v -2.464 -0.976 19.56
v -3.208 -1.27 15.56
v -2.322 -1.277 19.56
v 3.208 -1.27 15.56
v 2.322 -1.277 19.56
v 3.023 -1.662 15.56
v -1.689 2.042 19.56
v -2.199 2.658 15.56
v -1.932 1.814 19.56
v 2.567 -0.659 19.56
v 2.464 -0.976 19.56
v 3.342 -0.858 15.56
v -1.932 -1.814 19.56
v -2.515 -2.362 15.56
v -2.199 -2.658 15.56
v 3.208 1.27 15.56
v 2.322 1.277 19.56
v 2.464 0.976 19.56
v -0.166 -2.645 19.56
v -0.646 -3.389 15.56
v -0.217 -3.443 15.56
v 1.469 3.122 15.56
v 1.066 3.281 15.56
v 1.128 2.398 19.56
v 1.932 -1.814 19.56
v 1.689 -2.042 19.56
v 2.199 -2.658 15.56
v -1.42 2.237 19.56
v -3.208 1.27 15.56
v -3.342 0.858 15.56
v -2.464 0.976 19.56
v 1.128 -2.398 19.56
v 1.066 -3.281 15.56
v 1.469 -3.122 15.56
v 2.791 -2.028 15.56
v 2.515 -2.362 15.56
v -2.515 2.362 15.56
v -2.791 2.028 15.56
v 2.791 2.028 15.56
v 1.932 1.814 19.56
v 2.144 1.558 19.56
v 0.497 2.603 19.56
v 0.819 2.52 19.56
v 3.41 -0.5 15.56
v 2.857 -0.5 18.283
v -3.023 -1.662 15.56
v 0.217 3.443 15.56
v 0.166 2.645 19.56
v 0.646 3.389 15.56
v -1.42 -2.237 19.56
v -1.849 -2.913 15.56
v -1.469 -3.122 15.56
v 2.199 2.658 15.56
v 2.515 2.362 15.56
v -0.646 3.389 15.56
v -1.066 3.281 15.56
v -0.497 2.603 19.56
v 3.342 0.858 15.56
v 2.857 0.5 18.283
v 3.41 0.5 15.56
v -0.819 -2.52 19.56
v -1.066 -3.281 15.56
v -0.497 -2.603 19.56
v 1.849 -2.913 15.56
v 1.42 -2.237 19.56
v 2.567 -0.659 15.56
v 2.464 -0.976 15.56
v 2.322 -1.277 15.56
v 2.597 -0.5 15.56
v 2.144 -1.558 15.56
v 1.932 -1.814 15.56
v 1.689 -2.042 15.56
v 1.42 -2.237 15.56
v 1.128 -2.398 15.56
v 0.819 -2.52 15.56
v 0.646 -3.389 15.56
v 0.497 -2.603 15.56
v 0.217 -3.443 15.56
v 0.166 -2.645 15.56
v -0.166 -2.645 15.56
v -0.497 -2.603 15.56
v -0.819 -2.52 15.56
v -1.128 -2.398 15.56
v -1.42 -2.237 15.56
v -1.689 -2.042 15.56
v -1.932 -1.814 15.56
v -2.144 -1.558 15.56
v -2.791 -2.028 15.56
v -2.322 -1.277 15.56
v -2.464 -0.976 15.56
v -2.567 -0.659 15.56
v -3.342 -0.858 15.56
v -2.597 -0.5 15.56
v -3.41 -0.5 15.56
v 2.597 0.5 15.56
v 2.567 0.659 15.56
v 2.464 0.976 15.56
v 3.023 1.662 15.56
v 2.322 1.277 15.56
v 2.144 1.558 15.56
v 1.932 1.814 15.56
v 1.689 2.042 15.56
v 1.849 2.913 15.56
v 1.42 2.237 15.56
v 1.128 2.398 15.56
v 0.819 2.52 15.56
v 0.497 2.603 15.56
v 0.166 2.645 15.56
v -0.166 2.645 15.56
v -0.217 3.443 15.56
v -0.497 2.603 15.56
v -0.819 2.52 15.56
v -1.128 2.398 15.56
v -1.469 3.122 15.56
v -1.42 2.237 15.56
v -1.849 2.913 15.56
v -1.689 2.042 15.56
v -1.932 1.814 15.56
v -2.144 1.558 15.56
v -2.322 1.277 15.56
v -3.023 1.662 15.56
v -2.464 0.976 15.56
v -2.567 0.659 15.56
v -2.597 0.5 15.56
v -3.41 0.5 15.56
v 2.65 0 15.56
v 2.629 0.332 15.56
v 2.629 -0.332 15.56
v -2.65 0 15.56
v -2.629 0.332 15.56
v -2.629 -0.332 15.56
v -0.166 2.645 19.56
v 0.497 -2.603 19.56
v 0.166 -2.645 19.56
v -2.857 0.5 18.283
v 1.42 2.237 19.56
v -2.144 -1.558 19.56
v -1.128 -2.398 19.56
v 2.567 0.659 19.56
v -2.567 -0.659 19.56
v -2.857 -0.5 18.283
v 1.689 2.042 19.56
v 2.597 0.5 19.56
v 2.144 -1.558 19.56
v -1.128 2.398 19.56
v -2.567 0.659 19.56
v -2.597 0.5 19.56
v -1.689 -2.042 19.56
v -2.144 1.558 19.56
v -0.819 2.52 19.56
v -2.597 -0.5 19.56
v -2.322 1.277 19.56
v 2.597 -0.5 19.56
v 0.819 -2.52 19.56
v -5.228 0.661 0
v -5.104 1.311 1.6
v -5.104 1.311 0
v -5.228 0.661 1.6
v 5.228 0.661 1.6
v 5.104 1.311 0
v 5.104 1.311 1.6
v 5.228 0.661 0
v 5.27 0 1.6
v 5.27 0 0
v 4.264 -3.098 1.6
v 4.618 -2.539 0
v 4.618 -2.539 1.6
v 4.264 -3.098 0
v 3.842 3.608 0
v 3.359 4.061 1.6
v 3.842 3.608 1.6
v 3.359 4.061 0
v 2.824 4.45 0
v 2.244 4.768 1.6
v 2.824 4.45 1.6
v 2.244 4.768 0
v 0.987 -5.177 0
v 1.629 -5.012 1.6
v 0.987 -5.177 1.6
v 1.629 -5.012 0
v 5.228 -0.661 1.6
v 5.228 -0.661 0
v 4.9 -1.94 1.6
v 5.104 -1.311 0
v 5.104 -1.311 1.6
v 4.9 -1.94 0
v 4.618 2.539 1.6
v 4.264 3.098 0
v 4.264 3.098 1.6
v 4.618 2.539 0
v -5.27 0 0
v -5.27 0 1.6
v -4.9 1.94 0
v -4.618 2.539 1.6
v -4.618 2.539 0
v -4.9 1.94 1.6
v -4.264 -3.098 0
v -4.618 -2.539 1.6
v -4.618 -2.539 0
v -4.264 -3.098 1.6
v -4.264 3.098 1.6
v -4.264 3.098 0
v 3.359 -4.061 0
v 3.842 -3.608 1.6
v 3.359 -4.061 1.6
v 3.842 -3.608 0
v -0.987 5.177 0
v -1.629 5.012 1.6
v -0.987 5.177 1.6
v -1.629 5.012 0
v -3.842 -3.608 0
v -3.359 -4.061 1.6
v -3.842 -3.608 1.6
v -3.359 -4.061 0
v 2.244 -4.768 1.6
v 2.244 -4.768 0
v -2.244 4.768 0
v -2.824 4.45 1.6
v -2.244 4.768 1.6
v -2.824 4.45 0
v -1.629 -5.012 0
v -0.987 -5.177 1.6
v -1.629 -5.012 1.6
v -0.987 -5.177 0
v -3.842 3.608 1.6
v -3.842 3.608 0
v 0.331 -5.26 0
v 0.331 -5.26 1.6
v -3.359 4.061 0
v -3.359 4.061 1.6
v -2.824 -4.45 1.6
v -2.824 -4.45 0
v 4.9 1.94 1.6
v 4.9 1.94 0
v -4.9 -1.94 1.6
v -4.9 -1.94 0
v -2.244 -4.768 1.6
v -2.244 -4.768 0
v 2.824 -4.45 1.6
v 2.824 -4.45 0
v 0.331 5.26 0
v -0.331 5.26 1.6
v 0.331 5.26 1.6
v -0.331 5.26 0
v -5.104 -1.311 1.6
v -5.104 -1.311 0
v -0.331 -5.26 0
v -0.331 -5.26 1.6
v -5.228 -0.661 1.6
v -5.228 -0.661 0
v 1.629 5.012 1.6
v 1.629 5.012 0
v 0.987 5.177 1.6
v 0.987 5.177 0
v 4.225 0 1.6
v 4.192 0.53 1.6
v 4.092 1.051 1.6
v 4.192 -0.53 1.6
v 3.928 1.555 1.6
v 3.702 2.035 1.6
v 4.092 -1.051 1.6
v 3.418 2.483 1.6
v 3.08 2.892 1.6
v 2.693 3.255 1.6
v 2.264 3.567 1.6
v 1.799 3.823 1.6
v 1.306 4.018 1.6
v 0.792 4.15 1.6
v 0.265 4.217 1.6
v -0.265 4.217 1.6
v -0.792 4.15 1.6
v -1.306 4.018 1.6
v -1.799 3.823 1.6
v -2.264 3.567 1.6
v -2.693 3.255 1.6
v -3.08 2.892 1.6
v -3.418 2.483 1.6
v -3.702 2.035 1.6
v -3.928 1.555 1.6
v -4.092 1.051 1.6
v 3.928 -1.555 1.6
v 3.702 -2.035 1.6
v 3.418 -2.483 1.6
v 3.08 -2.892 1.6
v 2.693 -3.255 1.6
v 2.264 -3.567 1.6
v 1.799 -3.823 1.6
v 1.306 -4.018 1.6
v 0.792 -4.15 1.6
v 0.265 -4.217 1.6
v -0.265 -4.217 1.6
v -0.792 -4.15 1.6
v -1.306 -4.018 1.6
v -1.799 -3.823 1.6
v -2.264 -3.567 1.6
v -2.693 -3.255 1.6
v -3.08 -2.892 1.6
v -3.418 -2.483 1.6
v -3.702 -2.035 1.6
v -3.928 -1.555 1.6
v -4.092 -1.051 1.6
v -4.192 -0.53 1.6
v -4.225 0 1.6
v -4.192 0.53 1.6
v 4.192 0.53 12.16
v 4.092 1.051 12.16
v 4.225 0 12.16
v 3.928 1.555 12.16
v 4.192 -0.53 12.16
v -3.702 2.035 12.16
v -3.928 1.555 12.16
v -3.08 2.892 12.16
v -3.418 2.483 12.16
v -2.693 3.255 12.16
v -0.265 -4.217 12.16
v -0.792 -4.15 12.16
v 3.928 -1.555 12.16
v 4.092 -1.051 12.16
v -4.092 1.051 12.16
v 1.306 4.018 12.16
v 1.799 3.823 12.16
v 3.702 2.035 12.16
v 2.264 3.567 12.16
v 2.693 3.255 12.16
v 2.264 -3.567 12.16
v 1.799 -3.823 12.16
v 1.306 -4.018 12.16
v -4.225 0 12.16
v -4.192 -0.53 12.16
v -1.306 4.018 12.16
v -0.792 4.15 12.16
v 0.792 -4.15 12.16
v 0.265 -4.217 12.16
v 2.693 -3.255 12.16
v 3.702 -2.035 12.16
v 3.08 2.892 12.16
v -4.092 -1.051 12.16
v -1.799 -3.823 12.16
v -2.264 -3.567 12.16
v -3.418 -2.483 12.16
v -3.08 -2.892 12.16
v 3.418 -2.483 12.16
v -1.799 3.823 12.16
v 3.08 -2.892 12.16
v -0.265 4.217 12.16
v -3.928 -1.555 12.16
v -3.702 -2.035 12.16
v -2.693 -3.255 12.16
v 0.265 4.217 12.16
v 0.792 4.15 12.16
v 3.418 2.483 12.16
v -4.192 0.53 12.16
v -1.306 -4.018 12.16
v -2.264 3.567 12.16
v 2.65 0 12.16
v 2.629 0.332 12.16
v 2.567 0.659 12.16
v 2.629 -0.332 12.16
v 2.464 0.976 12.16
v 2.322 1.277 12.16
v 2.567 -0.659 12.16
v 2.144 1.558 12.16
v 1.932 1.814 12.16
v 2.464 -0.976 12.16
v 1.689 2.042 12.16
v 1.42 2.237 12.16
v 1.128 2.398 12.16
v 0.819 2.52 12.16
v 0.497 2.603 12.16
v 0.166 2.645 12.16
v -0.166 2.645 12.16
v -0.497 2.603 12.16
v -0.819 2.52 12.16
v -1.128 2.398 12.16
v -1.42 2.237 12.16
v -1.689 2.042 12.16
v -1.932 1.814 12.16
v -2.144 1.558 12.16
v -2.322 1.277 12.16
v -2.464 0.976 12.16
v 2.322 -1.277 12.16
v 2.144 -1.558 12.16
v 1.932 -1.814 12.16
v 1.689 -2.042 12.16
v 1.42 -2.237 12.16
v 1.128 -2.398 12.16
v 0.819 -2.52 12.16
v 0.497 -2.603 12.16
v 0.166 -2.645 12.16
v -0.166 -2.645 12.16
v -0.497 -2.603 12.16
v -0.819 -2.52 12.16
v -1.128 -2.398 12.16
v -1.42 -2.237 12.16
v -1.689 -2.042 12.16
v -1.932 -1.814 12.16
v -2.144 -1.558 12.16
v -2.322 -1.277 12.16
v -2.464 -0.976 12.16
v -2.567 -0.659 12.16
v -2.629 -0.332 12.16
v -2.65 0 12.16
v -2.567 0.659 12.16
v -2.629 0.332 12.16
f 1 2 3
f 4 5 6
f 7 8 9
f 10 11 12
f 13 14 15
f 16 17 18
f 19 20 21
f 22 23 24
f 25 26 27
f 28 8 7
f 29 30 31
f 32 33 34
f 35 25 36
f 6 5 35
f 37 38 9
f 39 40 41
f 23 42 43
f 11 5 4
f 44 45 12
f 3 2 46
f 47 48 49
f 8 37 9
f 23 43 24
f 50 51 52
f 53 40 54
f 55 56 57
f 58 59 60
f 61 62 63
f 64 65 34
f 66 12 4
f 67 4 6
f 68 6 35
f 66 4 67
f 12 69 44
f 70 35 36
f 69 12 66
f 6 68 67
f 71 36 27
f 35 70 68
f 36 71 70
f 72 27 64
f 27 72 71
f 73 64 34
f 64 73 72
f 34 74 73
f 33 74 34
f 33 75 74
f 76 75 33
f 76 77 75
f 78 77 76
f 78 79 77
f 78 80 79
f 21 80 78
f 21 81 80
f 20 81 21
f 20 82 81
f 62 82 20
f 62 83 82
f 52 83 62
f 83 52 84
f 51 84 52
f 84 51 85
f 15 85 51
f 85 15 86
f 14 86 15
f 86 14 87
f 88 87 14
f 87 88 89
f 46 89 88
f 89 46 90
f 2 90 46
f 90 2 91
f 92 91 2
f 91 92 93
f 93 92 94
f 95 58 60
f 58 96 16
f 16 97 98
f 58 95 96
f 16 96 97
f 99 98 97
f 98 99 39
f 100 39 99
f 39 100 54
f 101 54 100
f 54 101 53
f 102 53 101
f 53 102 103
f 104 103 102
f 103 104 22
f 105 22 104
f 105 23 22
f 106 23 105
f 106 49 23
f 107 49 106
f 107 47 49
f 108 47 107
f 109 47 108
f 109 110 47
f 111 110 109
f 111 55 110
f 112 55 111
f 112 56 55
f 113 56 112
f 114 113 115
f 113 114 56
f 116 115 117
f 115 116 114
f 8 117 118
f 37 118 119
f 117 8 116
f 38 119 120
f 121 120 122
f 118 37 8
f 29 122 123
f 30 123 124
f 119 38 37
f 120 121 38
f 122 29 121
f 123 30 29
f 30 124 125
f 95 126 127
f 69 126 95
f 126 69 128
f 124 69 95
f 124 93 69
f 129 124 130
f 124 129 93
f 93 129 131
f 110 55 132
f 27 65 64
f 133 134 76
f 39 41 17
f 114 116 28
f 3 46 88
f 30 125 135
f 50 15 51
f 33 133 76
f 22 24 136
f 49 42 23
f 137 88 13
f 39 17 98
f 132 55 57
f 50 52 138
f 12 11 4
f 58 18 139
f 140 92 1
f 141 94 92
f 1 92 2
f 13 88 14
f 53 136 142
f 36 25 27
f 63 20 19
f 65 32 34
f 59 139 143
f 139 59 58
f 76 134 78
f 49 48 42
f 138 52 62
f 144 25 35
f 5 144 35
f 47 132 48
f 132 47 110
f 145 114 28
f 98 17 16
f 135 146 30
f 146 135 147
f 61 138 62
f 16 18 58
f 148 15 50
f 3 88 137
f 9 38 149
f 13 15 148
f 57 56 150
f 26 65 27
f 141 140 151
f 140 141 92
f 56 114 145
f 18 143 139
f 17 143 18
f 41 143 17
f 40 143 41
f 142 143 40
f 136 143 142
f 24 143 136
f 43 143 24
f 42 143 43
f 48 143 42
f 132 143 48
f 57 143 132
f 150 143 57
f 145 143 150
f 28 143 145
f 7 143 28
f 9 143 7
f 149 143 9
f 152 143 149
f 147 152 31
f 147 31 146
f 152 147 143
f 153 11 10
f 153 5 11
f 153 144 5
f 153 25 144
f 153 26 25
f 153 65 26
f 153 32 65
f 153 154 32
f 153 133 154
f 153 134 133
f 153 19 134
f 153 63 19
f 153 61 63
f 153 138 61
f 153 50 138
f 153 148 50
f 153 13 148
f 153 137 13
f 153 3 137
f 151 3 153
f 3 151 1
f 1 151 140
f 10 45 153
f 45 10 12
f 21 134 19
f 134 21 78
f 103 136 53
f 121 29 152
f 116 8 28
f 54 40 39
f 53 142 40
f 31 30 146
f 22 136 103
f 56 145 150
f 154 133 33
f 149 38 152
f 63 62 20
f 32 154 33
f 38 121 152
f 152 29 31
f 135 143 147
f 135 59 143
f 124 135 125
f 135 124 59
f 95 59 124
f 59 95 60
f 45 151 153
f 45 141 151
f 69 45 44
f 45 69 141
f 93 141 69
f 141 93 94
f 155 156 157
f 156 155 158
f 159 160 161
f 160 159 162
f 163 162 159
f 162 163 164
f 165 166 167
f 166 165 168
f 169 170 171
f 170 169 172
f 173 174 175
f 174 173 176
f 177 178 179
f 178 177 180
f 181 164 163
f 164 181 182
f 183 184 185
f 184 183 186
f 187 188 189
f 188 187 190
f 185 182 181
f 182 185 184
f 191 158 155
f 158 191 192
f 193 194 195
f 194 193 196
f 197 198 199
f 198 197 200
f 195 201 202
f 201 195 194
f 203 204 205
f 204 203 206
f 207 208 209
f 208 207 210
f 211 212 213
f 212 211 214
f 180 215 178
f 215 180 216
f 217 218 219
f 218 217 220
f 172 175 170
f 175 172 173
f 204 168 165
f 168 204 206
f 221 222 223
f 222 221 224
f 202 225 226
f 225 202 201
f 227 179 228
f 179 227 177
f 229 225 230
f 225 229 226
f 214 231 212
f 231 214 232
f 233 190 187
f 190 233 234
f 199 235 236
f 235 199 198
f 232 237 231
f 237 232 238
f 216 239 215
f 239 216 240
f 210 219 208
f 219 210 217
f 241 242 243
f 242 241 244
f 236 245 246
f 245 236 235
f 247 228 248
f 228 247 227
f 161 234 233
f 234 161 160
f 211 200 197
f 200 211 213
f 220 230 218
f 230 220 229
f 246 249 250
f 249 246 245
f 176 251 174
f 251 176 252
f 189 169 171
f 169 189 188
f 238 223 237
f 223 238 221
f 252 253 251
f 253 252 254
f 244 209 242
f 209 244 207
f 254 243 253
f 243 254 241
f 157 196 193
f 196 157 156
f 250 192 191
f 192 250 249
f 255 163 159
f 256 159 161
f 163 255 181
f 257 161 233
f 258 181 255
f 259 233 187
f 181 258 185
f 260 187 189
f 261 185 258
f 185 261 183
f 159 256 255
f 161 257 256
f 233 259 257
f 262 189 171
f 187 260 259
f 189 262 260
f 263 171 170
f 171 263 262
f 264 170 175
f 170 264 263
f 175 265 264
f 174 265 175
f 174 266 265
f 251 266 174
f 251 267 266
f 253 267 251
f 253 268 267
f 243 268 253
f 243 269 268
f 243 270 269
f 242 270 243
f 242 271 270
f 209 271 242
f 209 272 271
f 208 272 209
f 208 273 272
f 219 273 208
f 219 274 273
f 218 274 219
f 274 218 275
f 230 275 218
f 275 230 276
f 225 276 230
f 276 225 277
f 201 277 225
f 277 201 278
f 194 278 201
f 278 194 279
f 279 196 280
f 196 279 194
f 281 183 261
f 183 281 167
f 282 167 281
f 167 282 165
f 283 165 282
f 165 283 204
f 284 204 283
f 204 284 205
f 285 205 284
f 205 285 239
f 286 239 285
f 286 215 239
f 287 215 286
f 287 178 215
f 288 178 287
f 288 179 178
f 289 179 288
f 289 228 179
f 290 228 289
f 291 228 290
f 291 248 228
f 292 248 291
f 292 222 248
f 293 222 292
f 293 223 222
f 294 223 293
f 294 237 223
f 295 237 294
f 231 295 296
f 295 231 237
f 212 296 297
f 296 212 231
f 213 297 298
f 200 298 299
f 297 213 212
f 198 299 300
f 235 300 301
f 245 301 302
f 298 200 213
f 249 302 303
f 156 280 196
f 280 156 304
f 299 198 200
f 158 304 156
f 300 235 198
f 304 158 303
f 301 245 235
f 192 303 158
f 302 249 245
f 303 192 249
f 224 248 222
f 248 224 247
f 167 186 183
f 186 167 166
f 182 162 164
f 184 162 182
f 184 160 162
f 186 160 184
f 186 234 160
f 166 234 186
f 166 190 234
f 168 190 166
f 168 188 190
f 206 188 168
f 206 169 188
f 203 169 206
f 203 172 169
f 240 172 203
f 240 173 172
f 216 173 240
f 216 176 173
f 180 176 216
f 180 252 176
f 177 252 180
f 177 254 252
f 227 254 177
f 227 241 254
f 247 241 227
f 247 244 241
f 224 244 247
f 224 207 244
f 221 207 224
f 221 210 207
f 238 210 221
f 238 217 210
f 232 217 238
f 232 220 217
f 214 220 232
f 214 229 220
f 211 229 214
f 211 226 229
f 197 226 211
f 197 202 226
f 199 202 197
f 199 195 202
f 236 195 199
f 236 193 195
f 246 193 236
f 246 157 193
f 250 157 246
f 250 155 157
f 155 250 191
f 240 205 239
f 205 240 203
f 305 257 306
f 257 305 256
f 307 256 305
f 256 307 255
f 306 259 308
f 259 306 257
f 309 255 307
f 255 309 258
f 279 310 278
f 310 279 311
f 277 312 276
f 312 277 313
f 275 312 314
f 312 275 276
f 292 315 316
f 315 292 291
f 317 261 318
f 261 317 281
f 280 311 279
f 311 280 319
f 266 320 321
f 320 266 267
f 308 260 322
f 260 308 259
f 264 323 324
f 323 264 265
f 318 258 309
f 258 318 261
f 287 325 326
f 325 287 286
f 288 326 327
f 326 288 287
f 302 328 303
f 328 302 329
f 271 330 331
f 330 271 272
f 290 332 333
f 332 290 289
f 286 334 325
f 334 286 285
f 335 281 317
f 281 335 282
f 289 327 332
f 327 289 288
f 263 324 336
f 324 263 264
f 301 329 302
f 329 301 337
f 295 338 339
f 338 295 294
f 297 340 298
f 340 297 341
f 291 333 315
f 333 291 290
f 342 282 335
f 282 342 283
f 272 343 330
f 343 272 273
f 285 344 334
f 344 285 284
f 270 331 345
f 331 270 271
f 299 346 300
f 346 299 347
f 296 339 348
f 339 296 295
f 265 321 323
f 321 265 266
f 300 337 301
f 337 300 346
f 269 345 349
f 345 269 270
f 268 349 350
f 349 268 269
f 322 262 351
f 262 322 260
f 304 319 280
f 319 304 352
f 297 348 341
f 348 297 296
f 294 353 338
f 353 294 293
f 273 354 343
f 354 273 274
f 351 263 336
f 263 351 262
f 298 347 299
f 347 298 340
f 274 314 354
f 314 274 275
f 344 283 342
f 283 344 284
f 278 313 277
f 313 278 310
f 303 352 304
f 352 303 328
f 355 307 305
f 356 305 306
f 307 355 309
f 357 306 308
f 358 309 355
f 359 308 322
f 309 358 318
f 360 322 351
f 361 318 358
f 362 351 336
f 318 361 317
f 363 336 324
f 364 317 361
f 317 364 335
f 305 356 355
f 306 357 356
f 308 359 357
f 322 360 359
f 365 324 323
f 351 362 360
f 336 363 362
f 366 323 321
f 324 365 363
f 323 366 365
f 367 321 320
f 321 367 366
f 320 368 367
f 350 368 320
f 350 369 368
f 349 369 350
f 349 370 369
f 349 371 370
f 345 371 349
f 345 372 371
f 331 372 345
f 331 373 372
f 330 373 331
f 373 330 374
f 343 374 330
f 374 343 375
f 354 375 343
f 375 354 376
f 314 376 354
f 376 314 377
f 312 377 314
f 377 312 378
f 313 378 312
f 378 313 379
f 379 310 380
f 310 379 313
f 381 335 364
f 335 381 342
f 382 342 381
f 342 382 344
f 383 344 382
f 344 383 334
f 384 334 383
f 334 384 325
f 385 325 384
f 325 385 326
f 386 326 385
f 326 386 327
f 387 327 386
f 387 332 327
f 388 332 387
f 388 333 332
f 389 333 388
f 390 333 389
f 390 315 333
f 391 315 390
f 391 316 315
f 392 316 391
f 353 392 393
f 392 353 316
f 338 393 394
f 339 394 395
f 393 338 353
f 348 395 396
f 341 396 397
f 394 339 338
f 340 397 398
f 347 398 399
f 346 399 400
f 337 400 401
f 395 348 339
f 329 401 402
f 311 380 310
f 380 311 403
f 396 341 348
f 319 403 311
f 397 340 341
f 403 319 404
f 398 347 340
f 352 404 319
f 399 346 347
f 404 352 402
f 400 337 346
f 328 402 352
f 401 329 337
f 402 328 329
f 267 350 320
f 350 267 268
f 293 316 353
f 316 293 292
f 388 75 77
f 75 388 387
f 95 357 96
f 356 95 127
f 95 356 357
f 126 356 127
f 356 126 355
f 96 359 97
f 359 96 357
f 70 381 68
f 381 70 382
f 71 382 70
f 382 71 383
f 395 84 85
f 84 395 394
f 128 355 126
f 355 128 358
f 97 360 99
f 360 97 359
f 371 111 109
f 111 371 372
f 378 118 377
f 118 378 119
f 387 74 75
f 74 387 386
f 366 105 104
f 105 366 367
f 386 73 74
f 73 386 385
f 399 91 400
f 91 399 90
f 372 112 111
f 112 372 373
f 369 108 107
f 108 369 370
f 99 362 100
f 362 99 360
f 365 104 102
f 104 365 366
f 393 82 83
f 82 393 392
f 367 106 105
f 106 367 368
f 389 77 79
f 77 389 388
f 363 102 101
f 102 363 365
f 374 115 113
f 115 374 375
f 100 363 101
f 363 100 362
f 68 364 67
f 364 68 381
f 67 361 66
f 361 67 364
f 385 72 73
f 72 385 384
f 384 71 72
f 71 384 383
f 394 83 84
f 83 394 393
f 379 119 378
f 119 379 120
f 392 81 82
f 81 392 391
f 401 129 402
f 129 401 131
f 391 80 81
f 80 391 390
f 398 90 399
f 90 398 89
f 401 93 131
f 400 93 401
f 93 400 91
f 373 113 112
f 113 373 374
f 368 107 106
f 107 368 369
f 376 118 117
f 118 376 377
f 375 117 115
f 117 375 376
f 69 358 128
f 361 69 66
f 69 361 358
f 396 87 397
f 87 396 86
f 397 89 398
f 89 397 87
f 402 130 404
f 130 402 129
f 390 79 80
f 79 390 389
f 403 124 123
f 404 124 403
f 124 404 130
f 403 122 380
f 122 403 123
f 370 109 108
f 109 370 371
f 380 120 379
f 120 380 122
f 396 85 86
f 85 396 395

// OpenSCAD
$fn=50;
//Whirlpool refrigerator drawer bearing peg:
cap_depth=1.6;
cap_diam=10.54;
bearing_depth=12.16;
bearing_diam=8.45;
lag_diam=5.3;
lag_depth=15.56;
retain_depth=4;
retain_max_diam=6.9;
retain_slit = 1;

module parametric_peg(cap_depth,
					cap_diam,
					bearing_depth,
					bearing_diam,
					lag_diam,
					lag_depth,
					retain_depth,
					retain_max_diam,
					retain_slit) {
	union() {
		//cap
		cylinder(d=cap_diam, h=cap_depth);
		//bearing
		cylinder(d=bearing_diam, h=bearing_depth);
		//lag
		cylinder(d=lag_diam, h=lag_depth);
		//retain
		difference() {
			translate([0,0,lag_depth]) cylinder(r1=retain_max_diam/2, r2=lag_diam/2, h=retain_depth);
			translate([-retain_max_diam/2,-retain_slit/2,lag_depth]) cube([retain_max_diam, retain_slit, retain_depth]);
		}
	}
}

parametric_peg(cap_depth,
					cap_diam,
					bearing_depth,
					bearing_diam,
					lag_diam,
					lag_depth,
					retain_depth,
					retain_max_diam,
					retain_slit);
